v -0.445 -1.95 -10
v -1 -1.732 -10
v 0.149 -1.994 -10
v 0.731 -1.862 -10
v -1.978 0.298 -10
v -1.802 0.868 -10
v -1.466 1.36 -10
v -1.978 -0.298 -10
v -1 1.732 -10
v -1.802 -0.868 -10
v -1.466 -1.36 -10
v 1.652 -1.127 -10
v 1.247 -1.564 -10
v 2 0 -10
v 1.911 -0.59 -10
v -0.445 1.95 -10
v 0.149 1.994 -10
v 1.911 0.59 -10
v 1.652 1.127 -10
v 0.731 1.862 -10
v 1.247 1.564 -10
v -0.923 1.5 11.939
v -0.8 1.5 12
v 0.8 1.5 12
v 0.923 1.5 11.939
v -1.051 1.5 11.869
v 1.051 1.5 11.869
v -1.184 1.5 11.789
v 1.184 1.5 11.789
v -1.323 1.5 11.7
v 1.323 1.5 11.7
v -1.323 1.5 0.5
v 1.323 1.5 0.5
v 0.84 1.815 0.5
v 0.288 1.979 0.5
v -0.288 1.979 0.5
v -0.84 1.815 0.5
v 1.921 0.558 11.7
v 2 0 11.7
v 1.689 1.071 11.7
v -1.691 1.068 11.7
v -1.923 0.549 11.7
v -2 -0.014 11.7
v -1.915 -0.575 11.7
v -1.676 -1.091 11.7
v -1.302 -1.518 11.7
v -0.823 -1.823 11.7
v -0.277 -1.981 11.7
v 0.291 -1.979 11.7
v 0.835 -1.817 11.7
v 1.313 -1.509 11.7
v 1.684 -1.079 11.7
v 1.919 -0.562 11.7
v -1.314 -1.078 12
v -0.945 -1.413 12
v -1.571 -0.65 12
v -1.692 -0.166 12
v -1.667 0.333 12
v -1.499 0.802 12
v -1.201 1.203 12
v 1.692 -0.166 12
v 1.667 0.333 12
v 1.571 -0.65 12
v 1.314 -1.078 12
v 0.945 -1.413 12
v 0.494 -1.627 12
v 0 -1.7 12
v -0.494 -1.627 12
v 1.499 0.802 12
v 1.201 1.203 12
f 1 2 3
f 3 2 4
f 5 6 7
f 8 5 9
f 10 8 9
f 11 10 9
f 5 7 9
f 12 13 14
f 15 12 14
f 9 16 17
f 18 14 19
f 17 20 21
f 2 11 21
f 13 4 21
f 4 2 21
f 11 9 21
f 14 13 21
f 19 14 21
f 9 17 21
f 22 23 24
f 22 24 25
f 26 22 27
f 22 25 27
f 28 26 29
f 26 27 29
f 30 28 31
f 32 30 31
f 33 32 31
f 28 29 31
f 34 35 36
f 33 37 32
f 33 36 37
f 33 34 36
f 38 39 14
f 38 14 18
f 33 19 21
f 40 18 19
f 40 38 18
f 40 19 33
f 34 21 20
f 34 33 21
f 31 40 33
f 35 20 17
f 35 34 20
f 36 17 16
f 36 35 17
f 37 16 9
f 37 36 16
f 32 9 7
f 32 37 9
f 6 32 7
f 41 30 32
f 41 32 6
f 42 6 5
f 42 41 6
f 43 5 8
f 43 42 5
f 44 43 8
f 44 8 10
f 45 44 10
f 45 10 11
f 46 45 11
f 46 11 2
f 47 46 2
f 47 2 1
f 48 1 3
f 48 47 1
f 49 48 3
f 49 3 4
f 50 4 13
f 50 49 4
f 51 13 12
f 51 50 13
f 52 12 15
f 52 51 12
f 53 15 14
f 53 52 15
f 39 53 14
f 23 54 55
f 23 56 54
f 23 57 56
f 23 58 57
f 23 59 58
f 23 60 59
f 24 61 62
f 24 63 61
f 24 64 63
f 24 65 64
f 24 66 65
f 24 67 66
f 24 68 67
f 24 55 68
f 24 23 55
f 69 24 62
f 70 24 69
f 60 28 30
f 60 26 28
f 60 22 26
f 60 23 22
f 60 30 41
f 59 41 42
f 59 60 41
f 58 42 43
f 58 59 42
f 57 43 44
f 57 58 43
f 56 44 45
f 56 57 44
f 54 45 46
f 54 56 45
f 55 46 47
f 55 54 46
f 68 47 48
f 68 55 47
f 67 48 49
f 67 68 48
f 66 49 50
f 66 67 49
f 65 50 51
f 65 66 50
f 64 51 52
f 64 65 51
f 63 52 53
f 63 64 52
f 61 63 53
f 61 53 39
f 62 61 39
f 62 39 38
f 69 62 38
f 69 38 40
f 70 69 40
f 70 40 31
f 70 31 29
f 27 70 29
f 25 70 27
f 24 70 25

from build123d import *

# Parameters (mm, degrees)
ESQUISSE1_R             = 2
BOSS_EXTRU_1_DEPTH      = 12
BOSS_EXTRU_1_DEPTH_BACK = 10
CHANFREIN1_SIZE         = 0.3
ESQUISSE2_W             = 2.645751312
ESQUISSE2_H             = 0.5
ENL_V_MAT_EXTRU_1_DEPTH = 11.5


with BuildPart() as part:
    # Esquisse1 → Boss.-Extru.1 (new body, two sides)
    with BuildSketch(Plane.XY) as boss_extru_1_sk:
        Circle(ESQUISSE1_R)
    extrude(amount=BOSS_EXTRU_1_DEPTH)
    extrude(boss_extru_1_sk.sketch, amount=-BOSS_EXTRU_1_DEPTH_BACK)

    # Chanfrein1
    chanfrein1_edges = [part.edges().sort_by_distance(p)[0] for p in [
        (-2, 0, 12),
    ]]
    chamfer(chanfrein1_edges, length=CHANFREIN1_SIZE)

    # Esquisse2 → Enlèv. mat.-Extru.1 (cut)
    with BuildSketch(Plane.XY.offset(12)):
        with Locations((0, 1.75)):
            Rectangle(ESQUISSE2_W, ESQUISSE2_H)
    extrude(amount=-ENL_V_MAT_EXTRU_1_DEPTH, mode=Mode.SUBTRACT)


solid = part.part
